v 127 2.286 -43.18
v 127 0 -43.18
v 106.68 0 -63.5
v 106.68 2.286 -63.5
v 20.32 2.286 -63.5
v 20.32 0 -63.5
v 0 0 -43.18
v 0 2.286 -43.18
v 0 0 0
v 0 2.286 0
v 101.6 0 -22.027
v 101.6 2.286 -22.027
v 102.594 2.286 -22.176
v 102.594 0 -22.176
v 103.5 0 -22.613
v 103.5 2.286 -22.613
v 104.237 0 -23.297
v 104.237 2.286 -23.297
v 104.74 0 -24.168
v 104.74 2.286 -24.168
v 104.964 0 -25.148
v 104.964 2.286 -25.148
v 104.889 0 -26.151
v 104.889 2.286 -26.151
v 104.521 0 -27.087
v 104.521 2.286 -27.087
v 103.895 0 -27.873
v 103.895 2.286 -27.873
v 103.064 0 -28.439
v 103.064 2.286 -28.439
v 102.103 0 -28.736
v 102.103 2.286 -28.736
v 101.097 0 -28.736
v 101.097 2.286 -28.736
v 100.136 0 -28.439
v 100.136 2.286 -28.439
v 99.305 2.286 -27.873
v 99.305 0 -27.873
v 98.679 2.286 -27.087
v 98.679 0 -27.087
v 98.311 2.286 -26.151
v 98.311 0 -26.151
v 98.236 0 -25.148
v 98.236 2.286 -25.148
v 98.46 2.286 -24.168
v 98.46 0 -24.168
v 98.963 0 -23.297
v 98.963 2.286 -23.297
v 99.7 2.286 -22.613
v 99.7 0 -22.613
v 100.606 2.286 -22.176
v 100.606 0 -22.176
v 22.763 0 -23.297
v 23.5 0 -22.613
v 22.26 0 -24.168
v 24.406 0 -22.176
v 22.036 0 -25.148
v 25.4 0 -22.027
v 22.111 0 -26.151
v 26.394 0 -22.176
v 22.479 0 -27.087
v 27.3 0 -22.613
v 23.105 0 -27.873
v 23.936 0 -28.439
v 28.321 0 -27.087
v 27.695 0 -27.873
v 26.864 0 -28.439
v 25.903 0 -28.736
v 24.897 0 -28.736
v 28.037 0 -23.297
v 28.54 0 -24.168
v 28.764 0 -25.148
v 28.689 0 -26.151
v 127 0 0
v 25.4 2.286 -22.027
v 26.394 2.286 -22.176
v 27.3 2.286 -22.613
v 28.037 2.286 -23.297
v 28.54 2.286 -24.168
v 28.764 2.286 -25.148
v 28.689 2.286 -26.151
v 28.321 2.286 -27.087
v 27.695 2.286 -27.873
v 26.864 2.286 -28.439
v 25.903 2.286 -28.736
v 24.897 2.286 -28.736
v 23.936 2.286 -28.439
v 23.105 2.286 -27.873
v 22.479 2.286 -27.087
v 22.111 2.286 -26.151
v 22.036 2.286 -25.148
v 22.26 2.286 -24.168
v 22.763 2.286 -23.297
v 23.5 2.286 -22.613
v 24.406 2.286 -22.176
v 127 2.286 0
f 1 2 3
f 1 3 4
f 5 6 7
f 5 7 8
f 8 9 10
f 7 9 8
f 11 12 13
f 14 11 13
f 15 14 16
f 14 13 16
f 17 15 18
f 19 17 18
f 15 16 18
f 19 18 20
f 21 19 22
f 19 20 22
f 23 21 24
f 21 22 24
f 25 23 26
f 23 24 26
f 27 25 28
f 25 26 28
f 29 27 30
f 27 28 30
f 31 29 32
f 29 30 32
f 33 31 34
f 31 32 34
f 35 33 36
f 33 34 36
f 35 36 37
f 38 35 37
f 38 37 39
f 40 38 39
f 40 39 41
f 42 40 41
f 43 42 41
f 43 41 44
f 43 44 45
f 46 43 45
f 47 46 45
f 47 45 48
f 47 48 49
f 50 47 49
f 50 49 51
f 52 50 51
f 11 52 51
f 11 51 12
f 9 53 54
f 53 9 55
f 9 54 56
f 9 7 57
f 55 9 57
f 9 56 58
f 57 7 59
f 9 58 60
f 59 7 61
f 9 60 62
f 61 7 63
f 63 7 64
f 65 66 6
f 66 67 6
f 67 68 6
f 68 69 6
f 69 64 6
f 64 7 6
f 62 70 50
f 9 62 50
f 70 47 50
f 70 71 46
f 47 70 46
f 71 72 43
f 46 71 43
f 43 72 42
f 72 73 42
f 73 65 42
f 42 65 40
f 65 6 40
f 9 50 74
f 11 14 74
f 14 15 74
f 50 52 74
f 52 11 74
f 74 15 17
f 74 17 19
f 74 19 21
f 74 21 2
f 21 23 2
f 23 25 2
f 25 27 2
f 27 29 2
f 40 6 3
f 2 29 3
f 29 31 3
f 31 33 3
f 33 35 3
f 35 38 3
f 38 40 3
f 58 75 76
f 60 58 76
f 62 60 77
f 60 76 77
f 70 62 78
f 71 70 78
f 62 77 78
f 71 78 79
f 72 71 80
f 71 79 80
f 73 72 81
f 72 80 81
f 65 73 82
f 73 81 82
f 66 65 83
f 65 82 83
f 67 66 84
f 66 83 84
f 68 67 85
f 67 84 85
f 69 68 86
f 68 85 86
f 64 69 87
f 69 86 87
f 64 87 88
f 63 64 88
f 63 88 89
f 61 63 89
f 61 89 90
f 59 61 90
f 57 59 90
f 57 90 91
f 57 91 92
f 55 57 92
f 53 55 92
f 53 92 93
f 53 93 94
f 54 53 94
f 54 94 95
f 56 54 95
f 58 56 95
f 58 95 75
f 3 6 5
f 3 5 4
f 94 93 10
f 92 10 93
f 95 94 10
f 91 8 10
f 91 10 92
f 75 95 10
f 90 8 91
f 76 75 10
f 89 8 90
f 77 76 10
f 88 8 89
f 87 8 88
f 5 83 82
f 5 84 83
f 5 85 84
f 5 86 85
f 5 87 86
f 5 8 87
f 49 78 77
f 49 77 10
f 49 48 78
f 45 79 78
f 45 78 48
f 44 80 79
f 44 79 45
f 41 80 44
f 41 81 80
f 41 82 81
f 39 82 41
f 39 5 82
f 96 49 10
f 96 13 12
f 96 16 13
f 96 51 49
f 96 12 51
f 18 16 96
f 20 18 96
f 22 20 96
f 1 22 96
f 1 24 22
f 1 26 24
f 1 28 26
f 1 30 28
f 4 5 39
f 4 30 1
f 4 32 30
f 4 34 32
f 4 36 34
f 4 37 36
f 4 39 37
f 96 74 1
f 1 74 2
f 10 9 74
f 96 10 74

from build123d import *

# Parameters (mm, degrees)
SKETCH1_W           = 127
SKETCH1_H           = 63.5
BOSS_EXTRUDE1_DEPTH = 2.286
SKETCH2_R           = 3.3734375
CUT_EXTRUDE1_DEPTH  = 143.008717324
CHAMFER1_SIZE       = 20.32


with BuildPart() as part:
    # Sketch1 → Boss-Extrude1 (new body)
    with BuildSketch(Plane(origin=(0, 0, 0), x_dir=(1, 0, 0), z_dir=(0, 1, 0))):
        with Locations((63.5, 31.75)):
            Rectangle(SKETCH1_W, SKETCH1_H)
    extrude(amount=BOSS_EXTRUDE1_DEPTH)

    # Sketch2 → Cut-Extrude1 (cut, through all)
    with BuildSketch(Plane(origin=(0, 2.286, 0), x_dir=(1, 0, 0), z_dir=(0, 1, 0))):
        with Locations(Location((25.4, 25.4, 0), (0, 0, 270))):
            Circle(SKETCH2_R)
        with Locations(Location((101.6, 25.4, 0), (0, 0, 270))):
            Circle(SKETCH2_R)
    extrude(amount=-CUT_EXTRUDE1_DEPTH, mode=Mode.SUBTRACT)

    # Chamfer1
    chamfer1_edges = [part.edges().sort_by_distance(p)[0] for p in [
        (0, 1.143, -63.5),
        (127, 1.143, -63.5),
    ]]
    chamfer(chamfer1_edges, length=CHAMFER1_SIZE)


solid = part.part
